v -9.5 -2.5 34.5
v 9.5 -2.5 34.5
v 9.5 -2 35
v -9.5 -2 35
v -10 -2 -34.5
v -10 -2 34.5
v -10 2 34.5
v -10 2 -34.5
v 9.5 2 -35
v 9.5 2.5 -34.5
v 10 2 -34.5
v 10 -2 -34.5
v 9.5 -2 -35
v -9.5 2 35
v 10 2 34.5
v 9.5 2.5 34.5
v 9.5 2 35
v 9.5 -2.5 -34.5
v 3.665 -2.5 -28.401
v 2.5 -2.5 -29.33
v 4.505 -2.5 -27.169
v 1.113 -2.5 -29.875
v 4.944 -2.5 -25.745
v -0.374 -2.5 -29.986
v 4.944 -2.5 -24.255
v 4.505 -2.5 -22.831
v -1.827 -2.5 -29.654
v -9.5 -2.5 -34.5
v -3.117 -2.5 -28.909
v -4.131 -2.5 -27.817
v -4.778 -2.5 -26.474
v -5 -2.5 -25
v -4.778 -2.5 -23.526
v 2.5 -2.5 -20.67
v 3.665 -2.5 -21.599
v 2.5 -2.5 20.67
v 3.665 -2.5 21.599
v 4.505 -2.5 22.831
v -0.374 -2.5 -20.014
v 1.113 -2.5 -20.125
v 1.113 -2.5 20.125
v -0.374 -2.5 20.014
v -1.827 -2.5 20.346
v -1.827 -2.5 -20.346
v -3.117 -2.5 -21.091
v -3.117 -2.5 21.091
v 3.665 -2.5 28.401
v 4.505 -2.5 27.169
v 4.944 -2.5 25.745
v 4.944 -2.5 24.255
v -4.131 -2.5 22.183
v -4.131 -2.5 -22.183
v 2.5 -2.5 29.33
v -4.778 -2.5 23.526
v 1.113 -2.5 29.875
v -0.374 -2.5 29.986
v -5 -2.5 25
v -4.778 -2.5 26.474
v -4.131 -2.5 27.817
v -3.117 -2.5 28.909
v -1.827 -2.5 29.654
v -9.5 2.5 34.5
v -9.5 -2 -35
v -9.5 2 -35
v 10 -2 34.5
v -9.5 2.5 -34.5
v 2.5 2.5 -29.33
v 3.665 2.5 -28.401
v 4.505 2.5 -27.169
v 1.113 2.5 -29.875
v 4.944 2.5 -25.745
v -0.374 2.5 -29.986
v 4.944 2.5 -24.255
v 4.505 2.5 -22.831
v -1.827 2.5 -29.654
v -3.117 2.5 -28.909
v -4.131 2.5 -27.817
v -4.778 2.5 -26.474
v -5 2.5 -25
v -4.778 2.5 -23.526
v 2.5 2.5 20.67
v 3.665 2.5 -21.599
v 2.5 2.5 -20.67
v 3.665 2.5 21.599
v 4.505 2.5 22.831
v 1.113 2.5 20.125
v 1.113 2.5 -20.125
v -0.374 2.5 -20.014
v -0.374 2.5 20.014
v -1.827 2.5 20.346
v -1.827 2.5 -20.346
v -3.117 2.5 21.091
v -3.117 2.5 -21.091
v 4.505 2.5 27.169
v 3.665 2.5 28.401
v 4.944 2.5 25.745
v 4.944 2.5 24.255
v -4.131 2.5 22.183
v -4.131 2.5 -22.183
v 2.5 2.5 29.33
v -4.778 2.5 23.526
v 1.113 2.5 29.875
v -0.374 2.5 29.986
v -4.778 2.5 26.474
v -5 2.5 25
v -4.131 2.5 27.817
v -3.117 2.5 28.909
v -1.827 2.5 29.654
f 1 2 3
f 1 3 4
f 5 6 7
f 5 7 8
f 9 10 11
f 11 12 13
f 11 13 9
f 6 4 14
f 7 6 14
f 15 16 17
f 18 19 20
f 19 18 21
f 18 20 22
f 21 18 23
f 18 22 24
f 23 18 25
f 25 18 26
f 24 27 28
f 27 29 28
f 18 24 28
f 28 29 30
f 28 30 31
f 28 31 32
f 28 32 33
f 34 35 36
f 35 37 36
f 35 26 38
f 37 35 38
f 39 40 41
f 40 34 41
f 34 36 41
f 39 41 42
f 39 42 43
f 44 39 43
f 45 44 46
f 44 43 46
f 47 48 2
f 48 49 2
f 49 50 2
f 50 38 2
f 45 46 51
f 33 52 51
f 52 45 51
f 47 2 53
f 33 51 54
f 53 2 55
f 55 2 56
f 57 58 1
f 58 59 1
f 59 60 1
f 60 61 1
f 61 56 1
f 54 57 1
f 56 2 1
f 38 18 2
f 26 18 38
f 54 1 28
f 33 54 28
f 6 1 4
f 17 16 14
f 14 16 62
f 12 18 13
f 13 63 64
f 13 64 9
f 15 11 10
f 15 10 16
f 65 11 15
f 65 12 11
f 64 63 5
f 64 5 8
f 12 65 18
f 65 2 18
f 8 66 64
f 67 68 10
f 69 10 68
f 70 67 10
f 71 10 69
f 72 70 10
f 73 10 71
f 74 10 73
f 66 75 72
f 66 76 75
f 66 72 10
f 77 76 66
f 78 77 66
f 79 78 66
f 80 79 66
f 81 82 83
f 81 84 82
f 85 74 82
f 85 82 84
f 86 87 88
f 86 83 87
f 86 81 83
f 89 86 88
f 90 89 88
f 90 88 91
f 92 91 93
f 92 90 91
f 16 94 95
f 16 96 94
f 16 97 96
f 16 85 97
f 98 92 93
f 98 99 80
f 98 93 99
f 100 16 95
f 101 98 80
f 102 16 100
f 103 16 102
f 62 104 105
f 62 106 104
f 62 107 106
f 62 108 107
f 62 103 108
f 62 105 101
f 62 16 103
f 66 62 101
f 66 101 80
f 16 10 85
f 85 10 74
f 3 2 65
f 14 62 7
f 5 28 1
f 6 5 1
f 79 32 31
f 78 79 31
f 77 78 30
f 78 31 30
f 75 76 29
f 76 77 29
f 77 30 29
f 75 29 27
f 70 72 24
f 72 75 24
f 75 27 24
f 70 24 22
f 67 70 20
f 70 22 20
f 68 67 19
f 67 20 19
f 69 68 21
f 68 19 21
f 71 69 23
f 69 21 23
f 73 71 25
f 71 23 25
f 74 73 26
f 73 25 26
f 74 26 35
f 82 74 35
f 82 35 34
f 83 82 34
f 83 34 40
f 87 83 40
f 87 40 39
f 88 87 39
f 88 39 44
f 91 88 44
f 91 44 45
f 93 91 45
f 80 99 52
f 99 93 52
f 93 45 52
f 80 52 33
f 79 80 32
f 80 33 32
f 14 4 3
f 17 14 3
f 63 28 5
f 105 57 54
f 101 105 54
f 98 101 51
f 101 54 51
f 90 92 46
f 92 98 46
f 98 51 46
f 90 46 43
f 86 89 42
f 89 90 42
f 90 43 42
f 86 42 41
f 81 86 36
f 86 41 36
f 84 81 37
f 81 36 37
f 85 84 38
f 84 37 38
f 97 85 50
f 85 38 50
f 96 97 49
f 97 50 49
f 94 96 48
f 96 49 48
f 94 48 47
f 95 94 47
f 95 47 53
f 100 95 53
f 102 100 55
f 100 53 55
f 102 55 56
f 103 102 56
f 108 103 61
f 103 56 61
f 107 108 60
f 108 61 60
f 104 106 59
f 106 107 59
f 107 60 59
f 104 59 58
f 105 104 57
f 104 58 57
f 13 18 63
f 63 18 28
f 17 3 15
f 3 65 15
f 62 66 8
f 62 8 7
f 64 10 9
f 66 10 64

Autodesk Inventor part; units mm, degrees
ref_plane "YZ Plane" through (0, 0, 0) normal (1, 0, 0) x (0, 1, 0)
ref_plane "XZ Plane" through (0, 0, 0) normal (0, 1, 0) x (-1, 0, 0)
ref_plane "XY Plane" through (0, 0, 0) normal (0, 0, 1) x (1, 0, 0)
sketch "Sketch1" plane through (0, 0, 0) normal (0, 1, 0) x (-1, 0, 0)
  circle A0 centre (0, 25) radius 5
  circle A1 centre (0, -25) radius 5
  line L0 (10, 35) -> (10, -35)
  line L1 (-10, -35) -> (-10, 35)
  line L2 (10, -35) -> (-10, -35)
  line L3 (10, 35) -> (-10, 35)
  line L4 (0, -25) -> (0, 25) construction
  point P0 (0, 0)
  point P1 (10, 0)
  point P2 (0, -35)
  point P3 (0, 35)
  point P4 (0, 0)
  dimension "d1" = 10
  dimension "d5" = 20
  dimension "d6" = 10
  dimension "d7" = 50
extrude "Extrusion1" add sketch "Sketch1" along normal mid plane 5
chamfer "Chamfer2" distance 0.5 angle 45 12 edges at (10, 2.5, 0) (0, 2.5, 35) (-10, 2.5, 0) (0, 2.5, -35) (0, -2.5, 35) (10, -2.5, 0) (-10, -2.5, 0) (0, -2.5, -35) (10, 0, 35) (-10, 0, 35) (10, 0, -35) (-10, 0, -35)
equation "\"d6\" = d5 - d1"
properties part number "link_c" material "Aluminium 6082 T6"
